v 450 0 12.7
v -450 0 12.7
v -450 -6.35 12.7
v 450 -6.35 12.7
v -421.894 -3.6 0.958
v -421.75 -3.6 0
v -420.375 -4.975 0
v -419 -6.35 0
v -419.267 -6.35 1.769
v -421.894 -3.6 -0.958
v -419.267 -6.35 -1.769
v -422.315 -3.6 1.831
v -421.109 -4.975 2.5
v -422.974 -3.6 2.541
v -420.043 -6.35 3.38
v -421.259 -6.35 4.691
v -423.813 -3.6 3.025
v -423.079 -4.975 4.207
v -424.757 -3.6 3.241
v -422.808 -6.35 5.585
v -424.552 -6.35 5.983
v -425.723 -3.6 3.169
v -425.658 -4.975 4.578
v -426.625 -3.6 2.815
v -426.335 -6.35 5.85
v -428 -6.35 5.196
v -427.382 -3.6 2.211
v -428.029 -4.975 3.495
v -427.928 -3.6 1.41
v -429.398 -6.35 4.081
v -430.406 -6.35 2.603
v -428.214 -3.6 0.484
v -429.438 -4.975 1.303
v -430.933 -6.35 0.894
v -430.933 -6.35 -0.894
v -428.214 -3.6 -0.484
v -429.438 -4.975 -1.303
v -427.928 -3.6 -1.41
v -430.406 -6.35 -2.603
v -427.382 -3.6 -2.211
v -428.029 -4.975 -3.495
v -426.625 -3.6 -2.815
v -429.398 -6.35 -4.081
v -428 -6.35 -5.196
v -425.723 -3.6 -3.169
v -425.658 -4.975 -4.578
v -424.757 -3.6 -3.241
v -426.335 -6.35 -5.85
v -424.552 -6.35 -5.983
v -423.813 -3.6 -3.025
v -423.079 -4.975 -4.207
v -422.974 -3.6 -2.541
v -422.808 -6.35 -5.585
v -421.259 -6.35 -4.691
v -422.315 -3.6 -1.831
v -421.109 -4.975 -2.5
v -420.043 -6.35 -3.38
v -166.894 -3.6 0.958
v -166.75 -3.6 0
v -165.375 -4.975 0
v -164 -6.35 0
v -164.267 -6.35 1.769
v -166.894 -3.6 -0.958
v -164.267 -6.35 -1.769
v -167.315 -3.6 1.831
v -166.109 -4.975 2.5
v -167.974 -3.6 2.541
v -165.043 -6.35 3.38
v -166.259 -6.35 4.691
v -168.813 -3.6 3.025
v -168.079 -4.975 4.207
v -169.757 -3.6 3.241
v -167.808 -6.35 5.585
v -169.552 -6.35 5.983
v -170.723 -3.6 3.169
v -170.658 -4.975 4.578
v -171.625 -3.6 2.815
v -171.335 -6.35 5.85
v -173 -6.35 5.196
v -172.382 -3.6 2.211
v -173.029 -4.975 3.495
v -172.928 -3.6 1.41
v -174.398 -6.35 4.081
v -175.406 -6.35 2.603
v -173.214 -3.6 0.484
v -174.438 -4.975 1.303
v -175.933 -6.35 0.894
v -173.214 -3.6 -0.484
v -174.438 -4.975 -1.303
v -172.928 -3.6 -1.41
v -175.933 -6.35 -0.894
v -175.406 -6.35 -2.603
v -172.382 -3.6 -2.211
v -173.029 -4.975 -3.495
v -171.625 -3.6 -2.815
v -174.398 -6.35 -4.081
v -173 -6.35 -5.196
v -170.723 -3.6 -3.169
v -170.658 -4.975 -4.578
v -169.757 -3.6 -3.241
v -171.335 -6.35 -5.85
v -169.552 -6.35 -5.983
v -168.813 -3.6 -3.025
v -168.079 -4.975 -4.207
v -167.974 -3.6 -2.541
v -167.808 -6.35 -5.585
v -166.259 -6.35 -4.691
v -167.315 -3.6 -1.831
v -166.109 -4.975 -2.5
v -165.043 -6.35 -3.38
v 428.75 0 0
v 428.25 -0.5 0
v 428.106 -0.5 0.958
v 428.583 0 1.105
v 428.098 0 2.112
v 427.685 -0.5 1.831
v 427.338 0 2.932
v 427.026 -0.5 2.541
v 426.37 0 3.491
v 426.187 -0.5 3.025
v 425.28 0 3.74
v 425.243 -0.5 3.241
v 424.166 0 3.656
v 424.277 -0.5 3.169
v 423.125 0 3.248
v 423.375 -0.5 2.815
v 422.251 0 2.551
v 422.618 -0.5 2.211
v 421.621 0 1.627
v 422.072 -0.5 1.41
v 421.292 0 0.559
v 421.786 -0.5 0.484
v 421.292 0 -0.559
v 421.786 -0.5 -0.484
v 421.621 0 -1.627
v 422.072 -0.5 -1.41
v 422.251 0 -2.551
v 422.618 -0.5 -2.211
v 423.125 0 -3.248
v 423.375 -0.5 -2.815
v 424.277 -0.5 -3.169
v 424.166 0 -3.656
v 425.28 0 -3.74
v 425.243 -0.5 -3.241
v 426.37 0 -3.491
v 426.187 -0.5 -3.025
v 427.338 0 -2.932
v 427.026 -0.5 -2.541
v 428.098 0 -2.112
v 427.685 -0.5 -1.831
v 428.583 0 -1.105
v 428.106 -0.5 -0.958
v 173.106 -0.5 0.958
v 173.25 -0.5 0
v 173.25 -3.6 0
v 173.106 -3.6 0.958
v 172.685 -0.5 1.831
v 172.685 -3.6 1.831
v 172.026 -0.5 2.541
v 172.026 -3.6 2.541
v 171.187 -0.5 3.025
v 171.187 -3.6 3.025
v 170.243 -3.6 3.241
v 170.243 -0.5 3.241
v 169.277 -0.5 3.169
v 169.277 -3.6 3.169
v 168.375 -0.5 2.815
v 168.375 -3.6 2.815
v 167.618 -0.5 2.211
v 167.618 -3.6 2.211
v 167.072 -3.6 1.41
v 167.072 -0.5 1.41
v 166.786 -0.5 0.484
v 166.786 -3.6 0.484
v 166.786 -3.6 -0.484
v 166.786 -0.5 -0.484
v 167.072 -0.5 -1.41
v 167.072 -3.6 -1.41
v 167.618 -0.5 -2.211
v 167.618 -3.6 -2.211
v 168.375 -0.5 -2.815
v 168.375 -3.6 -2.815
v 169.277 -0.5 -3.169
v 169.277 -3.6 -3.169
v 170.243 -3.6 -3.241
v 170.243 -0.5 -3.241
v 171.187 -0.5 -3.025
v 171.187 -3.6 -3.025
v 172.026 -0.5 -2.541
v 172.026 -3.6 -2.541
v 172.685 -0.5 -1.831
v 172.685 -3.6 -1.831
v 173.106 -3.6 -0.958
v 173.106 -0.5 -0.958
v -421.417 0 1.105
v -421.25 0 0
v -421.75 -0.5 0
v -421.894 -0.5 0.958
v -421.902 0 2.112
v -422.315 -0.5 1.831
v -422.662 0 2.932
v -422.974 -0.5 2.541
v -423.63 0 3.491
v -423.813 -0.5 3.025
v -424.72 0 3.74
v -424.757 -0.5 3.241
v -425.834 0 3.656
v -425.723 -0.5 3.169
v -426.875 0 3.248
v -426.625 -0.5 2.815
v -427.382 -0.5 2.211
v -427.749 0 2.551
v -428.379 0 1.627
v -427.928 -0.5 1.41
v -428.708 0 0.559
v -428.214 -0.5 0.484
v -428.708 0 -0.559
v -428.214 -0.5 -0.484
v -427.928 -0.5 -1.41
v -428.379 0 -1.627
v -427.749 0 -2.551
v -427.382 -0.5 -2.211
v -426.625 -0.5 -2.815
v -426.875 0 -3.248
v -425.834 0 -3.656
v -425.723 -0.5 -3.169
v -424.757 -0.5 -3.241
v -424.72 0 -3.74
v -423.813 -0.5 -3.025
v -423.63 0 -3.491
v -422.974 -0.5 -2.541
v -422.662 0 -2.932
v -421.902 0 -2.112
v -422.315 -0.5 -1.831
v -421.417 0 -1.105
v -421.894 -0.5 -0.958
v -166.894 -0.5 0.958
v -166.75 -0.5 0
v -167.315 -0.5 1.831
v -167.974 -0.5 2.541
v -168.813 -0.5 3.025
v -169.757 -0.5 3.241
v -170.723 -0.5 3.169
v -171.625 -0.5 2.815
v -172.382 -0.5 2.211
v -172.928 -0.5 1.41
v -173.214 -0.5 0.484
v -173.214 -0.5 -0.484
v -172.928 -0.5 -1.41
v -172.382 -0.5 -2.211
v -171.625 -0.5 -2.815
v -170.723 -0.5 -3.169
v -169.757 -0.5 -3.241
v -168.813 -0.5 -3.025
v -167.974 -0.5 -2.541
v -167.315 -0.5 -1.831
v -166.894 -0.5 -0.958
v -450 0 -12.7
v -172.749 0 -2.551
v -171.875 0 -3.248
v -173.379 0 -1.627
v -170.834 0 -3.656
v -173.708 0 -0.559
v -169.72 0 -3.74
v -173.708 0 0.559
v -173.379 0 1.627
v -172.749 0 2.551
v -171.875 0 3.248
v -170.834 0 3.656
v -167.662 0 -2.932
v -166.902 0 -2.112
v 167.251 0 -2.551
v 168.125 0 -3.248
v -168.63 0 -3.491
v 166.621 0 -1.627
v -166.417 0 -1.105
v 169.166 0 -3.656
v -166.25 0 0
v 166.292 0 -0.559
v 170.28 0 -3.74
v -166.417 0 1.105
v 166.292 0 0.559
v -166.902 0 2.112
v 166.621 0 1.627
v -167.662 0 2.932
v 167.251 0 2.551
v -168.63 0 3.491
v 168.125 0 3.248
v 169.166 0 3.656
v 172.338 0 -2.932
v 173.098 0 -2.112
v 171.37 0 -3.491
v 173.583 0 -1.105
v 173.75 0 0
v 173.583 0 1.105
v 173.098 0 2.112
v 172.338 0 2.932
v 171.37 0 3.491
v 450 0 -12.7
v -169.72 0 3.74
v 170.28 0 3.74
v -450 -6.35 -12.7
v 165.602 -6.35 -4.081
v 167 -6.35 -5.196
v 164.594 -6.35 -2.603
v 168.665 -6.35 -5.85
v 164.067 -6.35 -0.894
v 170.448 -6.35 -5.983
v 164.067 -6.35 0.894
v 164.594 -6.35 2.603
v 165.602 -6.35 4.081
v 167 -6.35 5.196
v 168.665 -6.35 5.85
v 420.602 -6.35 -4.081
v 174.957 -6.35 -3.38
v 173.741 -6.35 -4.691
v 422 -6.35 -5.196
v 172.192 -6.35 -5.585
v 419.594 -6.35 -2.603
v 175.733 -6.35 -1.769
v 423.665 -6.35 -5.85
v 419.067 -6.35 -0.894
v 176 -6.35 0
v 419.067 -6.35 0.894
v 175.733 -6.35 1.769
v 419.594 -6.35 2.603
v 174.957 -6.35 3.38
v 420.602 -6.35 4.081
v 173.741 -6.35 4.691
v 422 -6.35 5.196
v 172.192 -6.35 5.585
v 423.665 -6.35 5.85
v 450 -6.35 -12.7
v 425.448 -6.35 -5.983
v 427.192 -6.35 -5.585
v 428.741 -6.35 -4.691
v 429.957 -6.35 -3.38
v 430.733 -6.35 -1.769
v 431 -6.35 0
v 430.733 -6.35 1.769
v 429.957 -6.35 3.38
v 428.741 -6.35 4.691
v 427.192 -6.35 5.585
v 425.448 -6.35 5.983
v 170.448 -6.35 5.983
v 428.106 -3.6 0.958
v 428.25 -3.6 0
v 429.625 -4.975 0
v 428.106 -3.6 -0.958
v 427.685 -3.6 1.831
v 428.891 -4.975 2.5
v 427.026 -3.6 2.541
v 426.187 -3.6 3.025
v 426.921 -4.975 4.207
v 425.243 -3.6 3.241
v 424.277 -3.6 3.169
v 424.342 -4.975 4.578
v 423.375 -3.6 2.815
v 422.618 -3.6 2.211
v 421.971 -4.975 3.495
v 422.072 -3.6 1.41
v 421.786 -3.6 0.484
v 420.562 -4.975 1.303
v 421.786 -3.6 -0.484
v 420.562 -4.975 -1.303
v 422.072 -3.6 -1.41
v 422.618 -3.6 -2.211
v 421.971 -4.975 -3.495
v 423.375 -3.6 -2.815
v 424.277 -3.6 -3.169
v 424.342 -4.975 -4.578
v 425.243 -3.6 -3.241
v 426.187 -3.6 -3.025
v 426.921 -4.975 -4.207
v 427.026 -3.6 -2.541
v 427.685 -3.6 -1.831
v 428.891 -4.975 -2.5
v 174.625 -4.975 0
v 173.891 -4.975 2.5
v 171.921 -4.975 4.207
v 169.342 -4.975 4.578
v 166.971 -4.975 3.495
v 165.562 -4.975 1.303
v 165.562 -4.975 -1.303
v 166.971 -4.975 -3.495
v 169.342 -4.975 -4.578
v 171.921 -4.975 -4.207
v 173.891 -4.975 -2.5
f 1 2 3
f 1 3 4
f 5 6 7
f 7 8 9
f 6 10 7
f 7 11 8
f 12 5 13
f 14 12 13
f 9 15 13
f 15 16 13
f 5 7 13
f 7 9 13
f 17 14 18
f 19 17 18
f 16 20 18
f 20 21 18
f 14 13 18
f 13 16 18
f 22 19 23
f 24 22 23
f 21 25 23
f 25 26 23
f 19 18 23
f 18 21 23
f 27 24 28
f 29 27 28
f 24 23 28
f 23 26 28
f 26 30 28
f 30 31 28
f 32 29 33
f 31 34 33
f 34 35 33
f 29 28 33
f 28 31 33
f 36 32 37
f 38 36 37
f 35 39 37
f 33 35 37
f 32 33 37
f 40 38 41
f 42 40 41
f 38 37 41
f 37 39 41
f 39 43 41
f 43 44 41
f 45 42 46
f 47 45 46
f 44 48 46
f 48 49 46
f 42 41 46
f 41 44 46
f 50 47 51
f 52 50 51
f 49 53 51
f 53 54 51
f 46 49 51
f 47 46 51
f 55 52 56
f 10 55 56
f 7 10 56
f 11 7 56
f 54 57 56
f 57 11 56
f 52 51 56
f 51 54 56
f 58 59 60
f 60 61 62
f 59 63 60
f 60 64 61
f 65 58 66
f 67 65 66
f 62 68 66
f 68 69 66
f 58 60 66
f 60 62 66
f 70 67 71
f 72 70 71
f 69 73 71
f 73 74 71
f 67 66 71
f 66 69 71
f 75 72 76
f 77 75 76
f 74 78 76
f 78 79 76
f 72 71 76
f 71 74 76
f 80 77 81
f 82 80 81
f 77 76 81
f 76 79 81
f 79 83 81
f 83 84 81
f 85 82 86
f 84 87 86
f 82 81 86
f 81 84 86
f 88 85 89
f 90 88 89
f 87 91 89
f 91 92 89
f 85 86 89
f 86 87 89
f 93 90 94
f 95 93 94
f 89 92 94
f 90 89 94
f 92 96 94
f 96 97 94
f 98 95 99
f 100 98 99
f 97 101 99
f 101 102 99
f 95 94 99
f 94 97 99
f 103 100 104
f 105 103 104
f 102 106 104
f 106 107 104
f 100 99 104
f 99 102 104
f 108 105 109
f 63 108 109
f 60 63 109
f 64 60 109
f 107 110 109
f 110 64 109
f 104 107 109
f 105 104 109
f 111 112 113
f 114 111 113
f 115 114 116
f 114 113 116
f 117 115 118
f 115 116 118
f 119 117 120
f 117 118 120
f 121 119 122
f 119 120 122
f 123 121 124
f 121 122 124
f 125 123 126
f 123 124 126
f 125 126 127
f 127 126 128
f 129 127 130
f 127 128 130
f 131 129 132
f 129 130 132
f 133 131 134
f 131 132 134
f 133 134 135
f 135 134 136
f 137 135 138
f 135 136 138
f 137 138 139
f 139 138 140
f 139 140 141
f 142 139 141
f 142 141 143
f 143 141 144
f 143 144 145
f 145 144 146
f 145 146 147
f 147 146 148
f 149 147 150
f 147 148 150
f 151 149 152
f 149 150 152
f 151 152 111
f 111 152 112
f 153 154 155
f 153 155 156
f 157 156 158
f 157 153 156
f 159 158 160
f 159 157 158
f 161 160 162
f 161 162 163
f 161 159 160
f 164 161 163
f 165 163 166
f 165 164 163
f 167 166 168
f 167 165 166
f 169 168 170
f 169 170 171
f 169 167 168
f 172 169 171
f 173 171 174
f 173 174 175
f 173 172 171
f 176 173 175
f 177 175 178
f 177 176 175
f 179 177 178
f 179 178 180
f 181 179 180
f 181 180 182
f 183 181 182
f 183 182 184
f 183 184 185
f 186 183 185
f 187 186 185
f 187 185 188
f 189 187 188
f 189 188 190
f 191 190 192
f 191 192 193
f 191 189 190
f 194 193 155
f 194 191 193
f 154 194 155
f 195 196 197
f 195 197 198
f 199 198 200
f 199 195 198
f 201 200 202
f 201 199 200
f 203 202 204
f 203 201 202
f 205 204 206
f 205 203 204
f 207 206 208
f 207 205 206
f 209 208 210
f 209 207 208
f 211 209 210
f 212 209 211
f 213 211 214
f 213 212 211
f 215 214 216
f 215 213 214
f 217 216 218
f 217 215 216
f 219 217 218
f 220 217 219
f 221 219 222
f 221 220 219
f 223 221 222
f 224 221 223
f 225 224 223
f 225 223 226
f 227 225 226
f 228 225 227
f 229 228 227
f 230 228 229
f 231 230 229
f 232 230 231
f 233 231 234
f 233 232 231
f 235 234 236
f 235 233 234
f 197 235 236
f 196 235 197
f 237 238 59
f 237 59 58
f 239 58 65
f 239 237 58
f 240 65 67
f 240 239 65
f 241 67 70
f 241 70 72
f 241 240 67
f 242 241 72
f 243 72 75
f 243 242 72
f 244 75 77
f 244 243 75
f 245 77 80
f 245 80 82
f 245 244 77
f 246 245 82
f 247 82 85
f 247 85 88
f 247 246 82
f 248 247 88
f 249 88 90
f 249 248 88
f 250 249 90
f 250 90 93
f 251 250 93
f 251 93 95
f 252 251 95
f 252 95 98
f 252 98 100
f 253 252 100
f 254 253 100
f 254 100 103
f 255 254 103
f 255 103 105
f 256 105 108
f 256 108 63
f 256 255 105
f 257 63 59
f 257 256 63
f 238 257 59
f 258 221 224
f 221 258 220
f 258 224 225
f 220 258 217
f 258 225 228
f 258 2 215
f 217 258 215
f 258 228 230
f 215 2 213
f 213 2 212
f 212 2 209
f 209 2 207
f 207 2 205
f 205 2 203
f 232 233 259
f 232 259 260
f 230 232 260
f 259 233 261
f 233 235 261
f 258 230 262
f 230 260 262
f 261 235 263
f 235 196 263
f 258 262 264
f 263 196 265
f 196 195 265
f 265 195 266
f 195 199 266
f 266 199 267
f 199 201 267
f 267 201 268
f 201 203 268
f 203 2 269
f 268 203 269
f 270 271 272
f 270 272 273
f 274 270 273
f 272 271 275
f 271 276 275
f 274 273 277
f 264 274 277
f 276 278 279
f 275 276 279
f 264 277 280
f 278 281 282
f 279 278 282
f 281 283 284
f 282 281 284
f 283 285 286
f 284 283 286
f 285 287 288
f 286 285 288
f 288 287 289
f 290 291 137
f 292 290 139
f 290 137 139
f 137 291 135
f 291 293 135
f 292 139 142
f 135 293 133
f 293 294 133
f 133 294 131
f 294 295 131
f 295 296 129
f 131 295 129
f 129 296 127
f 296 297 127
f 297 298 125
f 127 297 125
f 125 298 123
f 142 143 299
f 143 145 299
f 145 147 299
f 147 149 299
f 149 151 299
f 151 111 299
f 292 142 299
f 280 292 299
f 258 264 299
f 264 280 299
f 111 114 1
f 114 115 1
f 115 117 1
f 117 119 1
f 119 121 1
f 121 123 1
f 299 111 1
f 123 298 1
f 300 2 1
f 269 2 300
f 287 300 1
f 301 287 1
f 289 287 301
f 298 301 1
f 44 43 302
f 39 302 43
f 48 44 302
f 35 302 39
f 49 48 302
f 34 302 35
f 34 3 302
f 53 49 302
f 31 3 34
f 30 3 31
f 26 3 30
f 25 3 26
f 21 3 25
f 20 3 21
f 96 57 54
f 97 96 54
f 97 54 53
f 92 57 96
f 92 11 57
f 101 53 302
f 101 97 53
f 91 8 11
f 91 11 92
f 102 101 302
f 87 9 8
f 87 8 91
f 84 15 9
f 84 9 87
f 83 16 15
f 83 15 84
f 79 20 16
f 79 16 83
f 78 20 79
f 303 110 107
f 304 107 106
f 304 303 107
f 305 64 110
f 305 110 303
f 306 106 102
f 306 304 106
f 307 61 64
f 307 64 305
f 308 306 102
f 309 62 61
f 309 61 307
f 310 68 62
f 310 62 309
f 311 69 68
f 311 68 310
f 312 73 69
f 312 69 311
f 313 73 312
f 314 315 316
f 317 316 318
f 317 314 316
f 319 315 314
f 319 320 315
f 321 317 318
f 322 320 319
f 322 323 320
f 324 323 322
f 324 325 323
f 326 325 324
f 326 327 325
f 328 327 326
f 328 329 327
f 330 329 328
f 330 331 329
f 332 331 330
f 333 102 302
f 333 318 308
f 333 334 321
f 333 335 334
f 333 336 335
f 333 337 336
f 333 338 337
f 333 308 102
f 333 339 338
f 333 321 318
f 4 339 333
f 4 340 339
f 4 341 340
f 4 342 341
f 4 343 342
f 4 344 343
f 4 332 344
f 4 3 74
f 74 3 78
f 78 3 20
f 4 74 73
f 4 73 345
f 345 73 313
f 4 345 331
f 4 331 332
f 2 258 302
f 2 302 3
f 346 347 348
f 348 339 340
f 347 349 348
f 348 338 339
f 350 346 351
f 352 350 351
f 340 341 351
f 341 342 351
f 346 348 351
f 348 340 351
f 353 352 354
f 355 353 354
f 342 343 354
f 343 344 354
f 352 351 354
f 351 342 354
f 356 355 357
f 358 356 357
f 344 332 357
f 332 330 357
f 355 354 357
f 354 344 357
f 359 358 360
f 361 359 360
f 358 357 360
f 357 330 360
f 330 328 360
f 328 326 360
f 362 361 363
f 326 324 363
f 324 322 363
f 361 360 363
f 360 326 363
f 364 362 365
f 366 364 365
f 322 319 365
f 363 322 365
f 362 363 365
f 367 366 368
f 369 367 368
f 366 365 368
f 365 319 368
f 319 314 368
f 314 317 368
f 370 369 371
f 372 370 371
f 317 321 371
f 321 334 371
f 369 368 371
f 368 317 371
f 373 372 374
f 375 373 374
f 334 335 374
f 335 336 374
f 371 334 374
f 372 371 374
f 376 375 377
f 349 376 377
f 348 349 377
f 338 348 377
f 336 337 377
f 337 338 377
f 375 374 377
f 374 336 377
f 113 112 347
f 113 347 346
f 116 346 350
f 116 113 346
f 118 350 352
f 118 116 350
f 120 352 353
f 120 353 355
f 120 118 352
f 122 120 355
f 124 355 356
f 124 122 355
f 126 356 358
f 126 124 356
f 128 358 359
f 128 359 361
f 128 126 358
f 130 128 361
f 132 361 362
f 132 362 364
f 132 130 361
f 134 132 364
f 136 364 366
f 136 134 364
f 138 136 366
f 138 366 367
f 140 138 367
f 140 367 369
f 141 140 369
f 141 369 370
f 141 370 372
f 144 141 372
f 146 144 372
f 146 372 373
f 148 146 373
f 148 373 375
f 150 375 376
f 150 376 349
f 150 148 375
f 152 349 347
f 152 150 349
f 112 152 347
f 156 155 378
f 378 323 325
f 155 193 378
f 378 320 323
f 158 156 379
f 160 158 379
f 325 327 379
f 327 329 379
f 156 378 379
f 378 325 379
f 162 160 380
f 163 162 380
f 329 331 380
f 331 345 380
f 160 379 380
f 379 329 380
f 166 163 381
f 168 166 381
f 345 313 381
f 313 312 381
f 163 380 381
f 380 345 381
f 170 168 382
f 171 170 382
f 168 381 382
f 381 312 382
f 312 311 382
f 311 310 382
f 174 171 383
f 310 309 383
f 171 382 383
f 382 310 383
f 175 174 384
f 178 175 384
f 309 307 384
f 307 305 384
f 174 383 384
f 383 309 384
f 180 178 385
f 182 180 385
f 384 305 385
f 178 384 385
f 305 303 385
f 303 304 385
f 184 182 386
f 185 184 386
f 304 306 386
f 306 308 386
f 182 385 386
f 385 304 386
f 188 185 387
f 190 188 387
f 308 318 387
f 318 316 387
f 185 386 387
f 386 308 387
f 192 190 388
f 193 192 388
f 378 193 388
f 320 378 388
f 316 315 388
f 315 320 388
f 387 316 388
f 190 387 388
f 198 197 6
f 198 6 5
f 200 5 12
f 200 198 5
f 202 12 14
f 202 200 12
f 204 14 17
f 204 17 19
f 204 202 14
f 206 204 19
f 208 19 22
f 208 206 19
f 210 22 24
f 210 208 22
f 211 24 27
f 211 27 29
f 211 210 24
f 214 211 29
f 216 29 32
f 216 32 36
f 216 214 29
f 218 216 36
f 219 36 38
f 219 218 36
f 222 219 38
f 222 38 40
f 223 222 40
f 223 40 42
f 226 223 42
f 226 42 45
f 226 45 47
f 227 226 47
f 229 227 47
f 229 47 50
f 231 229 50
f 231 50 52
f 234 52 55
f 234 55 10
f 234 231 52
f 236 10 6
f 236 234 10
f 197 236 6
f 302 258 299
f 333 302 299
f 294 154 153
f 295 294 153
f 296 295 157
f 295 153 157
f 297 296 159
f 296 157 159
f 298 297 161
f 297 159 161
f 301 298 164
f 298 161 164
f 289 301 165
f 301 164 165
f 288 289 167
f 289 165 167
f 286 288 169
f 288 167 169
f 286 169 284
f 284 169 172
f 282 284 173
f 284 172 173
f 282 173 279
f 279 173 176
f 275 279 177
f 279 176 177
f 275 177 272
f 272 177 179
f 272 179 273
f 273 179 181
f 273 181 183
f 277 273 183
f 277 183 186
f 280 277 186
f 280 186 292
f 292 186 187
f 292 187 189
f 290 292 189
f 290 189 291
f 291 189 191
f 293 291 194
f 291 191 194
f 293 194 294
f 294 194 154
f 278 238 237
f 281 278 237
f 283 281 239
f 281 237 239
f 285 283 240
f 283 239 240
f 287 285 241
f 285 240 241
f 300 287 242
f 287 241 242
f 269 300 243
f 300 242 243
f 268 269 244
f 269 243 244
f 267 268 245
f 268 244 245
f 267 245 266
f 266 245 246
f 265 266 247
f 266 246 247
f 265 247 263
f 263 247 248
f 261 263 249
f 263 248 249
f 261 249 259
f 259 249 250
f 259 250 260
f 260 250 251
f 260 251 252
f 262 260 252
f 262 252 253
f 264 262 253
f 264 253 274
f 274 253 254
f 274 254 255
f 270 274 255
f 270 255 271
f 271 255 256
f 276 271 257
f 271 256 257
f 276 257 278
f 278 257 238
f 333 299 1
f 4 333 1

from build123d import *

# Parameters (mm, degrees)
F0_W     = 900
F0_H     = 25.4
F0_R     = 3.25
F1_DEPTH = 6.35
F2_SIZE  = 2.75
F3_SIZE  = 0.5


with BuildPart() as f1:
    # F0 (on Front) → F1 (new body)
    with BuildSketch(Plane.XZ):
        Rectangle(F0_W, F0_H)
        with Locations((-425, 0)):
            Circle(F0_R, mode=Mode.SUBTRACT)
        with Locations((-170, 0)):
            Circle(F0_R, mode=Mode.SUBTRACT)
        with Locations((170, 0)):
            Circle(F0_R, mode=Mode.SUBTRACT)
        with Locations((425, 0)):
            Circle(F0_R, mode=Mode.SUBTRACT)
    extrude(amount=F1_DEPTH)

    # F2
    f2_edges = [f1.edges().sort_by_distance(p)[0] for p in [
        (-428.25, -6.35, 0),
        (-173.25, -6.35, 0),
        (166.75, -6.35, 0),
        (421.75, -6.35, 0),
    ]]
    chamfer(f2_edges, length=F2_SIZE)

    # F3
    f3_edges = [f1.edges().sort_by_distance(p)[0] for p in [
        (421.75, 0, 0),
        (166.75, 0, 0),
        (-173.25, 0, 0),
        (-428.25, 0, 0),
    ]]
    chamfer(f3_edges, length=F3_SIZE)


solid = f1.part
